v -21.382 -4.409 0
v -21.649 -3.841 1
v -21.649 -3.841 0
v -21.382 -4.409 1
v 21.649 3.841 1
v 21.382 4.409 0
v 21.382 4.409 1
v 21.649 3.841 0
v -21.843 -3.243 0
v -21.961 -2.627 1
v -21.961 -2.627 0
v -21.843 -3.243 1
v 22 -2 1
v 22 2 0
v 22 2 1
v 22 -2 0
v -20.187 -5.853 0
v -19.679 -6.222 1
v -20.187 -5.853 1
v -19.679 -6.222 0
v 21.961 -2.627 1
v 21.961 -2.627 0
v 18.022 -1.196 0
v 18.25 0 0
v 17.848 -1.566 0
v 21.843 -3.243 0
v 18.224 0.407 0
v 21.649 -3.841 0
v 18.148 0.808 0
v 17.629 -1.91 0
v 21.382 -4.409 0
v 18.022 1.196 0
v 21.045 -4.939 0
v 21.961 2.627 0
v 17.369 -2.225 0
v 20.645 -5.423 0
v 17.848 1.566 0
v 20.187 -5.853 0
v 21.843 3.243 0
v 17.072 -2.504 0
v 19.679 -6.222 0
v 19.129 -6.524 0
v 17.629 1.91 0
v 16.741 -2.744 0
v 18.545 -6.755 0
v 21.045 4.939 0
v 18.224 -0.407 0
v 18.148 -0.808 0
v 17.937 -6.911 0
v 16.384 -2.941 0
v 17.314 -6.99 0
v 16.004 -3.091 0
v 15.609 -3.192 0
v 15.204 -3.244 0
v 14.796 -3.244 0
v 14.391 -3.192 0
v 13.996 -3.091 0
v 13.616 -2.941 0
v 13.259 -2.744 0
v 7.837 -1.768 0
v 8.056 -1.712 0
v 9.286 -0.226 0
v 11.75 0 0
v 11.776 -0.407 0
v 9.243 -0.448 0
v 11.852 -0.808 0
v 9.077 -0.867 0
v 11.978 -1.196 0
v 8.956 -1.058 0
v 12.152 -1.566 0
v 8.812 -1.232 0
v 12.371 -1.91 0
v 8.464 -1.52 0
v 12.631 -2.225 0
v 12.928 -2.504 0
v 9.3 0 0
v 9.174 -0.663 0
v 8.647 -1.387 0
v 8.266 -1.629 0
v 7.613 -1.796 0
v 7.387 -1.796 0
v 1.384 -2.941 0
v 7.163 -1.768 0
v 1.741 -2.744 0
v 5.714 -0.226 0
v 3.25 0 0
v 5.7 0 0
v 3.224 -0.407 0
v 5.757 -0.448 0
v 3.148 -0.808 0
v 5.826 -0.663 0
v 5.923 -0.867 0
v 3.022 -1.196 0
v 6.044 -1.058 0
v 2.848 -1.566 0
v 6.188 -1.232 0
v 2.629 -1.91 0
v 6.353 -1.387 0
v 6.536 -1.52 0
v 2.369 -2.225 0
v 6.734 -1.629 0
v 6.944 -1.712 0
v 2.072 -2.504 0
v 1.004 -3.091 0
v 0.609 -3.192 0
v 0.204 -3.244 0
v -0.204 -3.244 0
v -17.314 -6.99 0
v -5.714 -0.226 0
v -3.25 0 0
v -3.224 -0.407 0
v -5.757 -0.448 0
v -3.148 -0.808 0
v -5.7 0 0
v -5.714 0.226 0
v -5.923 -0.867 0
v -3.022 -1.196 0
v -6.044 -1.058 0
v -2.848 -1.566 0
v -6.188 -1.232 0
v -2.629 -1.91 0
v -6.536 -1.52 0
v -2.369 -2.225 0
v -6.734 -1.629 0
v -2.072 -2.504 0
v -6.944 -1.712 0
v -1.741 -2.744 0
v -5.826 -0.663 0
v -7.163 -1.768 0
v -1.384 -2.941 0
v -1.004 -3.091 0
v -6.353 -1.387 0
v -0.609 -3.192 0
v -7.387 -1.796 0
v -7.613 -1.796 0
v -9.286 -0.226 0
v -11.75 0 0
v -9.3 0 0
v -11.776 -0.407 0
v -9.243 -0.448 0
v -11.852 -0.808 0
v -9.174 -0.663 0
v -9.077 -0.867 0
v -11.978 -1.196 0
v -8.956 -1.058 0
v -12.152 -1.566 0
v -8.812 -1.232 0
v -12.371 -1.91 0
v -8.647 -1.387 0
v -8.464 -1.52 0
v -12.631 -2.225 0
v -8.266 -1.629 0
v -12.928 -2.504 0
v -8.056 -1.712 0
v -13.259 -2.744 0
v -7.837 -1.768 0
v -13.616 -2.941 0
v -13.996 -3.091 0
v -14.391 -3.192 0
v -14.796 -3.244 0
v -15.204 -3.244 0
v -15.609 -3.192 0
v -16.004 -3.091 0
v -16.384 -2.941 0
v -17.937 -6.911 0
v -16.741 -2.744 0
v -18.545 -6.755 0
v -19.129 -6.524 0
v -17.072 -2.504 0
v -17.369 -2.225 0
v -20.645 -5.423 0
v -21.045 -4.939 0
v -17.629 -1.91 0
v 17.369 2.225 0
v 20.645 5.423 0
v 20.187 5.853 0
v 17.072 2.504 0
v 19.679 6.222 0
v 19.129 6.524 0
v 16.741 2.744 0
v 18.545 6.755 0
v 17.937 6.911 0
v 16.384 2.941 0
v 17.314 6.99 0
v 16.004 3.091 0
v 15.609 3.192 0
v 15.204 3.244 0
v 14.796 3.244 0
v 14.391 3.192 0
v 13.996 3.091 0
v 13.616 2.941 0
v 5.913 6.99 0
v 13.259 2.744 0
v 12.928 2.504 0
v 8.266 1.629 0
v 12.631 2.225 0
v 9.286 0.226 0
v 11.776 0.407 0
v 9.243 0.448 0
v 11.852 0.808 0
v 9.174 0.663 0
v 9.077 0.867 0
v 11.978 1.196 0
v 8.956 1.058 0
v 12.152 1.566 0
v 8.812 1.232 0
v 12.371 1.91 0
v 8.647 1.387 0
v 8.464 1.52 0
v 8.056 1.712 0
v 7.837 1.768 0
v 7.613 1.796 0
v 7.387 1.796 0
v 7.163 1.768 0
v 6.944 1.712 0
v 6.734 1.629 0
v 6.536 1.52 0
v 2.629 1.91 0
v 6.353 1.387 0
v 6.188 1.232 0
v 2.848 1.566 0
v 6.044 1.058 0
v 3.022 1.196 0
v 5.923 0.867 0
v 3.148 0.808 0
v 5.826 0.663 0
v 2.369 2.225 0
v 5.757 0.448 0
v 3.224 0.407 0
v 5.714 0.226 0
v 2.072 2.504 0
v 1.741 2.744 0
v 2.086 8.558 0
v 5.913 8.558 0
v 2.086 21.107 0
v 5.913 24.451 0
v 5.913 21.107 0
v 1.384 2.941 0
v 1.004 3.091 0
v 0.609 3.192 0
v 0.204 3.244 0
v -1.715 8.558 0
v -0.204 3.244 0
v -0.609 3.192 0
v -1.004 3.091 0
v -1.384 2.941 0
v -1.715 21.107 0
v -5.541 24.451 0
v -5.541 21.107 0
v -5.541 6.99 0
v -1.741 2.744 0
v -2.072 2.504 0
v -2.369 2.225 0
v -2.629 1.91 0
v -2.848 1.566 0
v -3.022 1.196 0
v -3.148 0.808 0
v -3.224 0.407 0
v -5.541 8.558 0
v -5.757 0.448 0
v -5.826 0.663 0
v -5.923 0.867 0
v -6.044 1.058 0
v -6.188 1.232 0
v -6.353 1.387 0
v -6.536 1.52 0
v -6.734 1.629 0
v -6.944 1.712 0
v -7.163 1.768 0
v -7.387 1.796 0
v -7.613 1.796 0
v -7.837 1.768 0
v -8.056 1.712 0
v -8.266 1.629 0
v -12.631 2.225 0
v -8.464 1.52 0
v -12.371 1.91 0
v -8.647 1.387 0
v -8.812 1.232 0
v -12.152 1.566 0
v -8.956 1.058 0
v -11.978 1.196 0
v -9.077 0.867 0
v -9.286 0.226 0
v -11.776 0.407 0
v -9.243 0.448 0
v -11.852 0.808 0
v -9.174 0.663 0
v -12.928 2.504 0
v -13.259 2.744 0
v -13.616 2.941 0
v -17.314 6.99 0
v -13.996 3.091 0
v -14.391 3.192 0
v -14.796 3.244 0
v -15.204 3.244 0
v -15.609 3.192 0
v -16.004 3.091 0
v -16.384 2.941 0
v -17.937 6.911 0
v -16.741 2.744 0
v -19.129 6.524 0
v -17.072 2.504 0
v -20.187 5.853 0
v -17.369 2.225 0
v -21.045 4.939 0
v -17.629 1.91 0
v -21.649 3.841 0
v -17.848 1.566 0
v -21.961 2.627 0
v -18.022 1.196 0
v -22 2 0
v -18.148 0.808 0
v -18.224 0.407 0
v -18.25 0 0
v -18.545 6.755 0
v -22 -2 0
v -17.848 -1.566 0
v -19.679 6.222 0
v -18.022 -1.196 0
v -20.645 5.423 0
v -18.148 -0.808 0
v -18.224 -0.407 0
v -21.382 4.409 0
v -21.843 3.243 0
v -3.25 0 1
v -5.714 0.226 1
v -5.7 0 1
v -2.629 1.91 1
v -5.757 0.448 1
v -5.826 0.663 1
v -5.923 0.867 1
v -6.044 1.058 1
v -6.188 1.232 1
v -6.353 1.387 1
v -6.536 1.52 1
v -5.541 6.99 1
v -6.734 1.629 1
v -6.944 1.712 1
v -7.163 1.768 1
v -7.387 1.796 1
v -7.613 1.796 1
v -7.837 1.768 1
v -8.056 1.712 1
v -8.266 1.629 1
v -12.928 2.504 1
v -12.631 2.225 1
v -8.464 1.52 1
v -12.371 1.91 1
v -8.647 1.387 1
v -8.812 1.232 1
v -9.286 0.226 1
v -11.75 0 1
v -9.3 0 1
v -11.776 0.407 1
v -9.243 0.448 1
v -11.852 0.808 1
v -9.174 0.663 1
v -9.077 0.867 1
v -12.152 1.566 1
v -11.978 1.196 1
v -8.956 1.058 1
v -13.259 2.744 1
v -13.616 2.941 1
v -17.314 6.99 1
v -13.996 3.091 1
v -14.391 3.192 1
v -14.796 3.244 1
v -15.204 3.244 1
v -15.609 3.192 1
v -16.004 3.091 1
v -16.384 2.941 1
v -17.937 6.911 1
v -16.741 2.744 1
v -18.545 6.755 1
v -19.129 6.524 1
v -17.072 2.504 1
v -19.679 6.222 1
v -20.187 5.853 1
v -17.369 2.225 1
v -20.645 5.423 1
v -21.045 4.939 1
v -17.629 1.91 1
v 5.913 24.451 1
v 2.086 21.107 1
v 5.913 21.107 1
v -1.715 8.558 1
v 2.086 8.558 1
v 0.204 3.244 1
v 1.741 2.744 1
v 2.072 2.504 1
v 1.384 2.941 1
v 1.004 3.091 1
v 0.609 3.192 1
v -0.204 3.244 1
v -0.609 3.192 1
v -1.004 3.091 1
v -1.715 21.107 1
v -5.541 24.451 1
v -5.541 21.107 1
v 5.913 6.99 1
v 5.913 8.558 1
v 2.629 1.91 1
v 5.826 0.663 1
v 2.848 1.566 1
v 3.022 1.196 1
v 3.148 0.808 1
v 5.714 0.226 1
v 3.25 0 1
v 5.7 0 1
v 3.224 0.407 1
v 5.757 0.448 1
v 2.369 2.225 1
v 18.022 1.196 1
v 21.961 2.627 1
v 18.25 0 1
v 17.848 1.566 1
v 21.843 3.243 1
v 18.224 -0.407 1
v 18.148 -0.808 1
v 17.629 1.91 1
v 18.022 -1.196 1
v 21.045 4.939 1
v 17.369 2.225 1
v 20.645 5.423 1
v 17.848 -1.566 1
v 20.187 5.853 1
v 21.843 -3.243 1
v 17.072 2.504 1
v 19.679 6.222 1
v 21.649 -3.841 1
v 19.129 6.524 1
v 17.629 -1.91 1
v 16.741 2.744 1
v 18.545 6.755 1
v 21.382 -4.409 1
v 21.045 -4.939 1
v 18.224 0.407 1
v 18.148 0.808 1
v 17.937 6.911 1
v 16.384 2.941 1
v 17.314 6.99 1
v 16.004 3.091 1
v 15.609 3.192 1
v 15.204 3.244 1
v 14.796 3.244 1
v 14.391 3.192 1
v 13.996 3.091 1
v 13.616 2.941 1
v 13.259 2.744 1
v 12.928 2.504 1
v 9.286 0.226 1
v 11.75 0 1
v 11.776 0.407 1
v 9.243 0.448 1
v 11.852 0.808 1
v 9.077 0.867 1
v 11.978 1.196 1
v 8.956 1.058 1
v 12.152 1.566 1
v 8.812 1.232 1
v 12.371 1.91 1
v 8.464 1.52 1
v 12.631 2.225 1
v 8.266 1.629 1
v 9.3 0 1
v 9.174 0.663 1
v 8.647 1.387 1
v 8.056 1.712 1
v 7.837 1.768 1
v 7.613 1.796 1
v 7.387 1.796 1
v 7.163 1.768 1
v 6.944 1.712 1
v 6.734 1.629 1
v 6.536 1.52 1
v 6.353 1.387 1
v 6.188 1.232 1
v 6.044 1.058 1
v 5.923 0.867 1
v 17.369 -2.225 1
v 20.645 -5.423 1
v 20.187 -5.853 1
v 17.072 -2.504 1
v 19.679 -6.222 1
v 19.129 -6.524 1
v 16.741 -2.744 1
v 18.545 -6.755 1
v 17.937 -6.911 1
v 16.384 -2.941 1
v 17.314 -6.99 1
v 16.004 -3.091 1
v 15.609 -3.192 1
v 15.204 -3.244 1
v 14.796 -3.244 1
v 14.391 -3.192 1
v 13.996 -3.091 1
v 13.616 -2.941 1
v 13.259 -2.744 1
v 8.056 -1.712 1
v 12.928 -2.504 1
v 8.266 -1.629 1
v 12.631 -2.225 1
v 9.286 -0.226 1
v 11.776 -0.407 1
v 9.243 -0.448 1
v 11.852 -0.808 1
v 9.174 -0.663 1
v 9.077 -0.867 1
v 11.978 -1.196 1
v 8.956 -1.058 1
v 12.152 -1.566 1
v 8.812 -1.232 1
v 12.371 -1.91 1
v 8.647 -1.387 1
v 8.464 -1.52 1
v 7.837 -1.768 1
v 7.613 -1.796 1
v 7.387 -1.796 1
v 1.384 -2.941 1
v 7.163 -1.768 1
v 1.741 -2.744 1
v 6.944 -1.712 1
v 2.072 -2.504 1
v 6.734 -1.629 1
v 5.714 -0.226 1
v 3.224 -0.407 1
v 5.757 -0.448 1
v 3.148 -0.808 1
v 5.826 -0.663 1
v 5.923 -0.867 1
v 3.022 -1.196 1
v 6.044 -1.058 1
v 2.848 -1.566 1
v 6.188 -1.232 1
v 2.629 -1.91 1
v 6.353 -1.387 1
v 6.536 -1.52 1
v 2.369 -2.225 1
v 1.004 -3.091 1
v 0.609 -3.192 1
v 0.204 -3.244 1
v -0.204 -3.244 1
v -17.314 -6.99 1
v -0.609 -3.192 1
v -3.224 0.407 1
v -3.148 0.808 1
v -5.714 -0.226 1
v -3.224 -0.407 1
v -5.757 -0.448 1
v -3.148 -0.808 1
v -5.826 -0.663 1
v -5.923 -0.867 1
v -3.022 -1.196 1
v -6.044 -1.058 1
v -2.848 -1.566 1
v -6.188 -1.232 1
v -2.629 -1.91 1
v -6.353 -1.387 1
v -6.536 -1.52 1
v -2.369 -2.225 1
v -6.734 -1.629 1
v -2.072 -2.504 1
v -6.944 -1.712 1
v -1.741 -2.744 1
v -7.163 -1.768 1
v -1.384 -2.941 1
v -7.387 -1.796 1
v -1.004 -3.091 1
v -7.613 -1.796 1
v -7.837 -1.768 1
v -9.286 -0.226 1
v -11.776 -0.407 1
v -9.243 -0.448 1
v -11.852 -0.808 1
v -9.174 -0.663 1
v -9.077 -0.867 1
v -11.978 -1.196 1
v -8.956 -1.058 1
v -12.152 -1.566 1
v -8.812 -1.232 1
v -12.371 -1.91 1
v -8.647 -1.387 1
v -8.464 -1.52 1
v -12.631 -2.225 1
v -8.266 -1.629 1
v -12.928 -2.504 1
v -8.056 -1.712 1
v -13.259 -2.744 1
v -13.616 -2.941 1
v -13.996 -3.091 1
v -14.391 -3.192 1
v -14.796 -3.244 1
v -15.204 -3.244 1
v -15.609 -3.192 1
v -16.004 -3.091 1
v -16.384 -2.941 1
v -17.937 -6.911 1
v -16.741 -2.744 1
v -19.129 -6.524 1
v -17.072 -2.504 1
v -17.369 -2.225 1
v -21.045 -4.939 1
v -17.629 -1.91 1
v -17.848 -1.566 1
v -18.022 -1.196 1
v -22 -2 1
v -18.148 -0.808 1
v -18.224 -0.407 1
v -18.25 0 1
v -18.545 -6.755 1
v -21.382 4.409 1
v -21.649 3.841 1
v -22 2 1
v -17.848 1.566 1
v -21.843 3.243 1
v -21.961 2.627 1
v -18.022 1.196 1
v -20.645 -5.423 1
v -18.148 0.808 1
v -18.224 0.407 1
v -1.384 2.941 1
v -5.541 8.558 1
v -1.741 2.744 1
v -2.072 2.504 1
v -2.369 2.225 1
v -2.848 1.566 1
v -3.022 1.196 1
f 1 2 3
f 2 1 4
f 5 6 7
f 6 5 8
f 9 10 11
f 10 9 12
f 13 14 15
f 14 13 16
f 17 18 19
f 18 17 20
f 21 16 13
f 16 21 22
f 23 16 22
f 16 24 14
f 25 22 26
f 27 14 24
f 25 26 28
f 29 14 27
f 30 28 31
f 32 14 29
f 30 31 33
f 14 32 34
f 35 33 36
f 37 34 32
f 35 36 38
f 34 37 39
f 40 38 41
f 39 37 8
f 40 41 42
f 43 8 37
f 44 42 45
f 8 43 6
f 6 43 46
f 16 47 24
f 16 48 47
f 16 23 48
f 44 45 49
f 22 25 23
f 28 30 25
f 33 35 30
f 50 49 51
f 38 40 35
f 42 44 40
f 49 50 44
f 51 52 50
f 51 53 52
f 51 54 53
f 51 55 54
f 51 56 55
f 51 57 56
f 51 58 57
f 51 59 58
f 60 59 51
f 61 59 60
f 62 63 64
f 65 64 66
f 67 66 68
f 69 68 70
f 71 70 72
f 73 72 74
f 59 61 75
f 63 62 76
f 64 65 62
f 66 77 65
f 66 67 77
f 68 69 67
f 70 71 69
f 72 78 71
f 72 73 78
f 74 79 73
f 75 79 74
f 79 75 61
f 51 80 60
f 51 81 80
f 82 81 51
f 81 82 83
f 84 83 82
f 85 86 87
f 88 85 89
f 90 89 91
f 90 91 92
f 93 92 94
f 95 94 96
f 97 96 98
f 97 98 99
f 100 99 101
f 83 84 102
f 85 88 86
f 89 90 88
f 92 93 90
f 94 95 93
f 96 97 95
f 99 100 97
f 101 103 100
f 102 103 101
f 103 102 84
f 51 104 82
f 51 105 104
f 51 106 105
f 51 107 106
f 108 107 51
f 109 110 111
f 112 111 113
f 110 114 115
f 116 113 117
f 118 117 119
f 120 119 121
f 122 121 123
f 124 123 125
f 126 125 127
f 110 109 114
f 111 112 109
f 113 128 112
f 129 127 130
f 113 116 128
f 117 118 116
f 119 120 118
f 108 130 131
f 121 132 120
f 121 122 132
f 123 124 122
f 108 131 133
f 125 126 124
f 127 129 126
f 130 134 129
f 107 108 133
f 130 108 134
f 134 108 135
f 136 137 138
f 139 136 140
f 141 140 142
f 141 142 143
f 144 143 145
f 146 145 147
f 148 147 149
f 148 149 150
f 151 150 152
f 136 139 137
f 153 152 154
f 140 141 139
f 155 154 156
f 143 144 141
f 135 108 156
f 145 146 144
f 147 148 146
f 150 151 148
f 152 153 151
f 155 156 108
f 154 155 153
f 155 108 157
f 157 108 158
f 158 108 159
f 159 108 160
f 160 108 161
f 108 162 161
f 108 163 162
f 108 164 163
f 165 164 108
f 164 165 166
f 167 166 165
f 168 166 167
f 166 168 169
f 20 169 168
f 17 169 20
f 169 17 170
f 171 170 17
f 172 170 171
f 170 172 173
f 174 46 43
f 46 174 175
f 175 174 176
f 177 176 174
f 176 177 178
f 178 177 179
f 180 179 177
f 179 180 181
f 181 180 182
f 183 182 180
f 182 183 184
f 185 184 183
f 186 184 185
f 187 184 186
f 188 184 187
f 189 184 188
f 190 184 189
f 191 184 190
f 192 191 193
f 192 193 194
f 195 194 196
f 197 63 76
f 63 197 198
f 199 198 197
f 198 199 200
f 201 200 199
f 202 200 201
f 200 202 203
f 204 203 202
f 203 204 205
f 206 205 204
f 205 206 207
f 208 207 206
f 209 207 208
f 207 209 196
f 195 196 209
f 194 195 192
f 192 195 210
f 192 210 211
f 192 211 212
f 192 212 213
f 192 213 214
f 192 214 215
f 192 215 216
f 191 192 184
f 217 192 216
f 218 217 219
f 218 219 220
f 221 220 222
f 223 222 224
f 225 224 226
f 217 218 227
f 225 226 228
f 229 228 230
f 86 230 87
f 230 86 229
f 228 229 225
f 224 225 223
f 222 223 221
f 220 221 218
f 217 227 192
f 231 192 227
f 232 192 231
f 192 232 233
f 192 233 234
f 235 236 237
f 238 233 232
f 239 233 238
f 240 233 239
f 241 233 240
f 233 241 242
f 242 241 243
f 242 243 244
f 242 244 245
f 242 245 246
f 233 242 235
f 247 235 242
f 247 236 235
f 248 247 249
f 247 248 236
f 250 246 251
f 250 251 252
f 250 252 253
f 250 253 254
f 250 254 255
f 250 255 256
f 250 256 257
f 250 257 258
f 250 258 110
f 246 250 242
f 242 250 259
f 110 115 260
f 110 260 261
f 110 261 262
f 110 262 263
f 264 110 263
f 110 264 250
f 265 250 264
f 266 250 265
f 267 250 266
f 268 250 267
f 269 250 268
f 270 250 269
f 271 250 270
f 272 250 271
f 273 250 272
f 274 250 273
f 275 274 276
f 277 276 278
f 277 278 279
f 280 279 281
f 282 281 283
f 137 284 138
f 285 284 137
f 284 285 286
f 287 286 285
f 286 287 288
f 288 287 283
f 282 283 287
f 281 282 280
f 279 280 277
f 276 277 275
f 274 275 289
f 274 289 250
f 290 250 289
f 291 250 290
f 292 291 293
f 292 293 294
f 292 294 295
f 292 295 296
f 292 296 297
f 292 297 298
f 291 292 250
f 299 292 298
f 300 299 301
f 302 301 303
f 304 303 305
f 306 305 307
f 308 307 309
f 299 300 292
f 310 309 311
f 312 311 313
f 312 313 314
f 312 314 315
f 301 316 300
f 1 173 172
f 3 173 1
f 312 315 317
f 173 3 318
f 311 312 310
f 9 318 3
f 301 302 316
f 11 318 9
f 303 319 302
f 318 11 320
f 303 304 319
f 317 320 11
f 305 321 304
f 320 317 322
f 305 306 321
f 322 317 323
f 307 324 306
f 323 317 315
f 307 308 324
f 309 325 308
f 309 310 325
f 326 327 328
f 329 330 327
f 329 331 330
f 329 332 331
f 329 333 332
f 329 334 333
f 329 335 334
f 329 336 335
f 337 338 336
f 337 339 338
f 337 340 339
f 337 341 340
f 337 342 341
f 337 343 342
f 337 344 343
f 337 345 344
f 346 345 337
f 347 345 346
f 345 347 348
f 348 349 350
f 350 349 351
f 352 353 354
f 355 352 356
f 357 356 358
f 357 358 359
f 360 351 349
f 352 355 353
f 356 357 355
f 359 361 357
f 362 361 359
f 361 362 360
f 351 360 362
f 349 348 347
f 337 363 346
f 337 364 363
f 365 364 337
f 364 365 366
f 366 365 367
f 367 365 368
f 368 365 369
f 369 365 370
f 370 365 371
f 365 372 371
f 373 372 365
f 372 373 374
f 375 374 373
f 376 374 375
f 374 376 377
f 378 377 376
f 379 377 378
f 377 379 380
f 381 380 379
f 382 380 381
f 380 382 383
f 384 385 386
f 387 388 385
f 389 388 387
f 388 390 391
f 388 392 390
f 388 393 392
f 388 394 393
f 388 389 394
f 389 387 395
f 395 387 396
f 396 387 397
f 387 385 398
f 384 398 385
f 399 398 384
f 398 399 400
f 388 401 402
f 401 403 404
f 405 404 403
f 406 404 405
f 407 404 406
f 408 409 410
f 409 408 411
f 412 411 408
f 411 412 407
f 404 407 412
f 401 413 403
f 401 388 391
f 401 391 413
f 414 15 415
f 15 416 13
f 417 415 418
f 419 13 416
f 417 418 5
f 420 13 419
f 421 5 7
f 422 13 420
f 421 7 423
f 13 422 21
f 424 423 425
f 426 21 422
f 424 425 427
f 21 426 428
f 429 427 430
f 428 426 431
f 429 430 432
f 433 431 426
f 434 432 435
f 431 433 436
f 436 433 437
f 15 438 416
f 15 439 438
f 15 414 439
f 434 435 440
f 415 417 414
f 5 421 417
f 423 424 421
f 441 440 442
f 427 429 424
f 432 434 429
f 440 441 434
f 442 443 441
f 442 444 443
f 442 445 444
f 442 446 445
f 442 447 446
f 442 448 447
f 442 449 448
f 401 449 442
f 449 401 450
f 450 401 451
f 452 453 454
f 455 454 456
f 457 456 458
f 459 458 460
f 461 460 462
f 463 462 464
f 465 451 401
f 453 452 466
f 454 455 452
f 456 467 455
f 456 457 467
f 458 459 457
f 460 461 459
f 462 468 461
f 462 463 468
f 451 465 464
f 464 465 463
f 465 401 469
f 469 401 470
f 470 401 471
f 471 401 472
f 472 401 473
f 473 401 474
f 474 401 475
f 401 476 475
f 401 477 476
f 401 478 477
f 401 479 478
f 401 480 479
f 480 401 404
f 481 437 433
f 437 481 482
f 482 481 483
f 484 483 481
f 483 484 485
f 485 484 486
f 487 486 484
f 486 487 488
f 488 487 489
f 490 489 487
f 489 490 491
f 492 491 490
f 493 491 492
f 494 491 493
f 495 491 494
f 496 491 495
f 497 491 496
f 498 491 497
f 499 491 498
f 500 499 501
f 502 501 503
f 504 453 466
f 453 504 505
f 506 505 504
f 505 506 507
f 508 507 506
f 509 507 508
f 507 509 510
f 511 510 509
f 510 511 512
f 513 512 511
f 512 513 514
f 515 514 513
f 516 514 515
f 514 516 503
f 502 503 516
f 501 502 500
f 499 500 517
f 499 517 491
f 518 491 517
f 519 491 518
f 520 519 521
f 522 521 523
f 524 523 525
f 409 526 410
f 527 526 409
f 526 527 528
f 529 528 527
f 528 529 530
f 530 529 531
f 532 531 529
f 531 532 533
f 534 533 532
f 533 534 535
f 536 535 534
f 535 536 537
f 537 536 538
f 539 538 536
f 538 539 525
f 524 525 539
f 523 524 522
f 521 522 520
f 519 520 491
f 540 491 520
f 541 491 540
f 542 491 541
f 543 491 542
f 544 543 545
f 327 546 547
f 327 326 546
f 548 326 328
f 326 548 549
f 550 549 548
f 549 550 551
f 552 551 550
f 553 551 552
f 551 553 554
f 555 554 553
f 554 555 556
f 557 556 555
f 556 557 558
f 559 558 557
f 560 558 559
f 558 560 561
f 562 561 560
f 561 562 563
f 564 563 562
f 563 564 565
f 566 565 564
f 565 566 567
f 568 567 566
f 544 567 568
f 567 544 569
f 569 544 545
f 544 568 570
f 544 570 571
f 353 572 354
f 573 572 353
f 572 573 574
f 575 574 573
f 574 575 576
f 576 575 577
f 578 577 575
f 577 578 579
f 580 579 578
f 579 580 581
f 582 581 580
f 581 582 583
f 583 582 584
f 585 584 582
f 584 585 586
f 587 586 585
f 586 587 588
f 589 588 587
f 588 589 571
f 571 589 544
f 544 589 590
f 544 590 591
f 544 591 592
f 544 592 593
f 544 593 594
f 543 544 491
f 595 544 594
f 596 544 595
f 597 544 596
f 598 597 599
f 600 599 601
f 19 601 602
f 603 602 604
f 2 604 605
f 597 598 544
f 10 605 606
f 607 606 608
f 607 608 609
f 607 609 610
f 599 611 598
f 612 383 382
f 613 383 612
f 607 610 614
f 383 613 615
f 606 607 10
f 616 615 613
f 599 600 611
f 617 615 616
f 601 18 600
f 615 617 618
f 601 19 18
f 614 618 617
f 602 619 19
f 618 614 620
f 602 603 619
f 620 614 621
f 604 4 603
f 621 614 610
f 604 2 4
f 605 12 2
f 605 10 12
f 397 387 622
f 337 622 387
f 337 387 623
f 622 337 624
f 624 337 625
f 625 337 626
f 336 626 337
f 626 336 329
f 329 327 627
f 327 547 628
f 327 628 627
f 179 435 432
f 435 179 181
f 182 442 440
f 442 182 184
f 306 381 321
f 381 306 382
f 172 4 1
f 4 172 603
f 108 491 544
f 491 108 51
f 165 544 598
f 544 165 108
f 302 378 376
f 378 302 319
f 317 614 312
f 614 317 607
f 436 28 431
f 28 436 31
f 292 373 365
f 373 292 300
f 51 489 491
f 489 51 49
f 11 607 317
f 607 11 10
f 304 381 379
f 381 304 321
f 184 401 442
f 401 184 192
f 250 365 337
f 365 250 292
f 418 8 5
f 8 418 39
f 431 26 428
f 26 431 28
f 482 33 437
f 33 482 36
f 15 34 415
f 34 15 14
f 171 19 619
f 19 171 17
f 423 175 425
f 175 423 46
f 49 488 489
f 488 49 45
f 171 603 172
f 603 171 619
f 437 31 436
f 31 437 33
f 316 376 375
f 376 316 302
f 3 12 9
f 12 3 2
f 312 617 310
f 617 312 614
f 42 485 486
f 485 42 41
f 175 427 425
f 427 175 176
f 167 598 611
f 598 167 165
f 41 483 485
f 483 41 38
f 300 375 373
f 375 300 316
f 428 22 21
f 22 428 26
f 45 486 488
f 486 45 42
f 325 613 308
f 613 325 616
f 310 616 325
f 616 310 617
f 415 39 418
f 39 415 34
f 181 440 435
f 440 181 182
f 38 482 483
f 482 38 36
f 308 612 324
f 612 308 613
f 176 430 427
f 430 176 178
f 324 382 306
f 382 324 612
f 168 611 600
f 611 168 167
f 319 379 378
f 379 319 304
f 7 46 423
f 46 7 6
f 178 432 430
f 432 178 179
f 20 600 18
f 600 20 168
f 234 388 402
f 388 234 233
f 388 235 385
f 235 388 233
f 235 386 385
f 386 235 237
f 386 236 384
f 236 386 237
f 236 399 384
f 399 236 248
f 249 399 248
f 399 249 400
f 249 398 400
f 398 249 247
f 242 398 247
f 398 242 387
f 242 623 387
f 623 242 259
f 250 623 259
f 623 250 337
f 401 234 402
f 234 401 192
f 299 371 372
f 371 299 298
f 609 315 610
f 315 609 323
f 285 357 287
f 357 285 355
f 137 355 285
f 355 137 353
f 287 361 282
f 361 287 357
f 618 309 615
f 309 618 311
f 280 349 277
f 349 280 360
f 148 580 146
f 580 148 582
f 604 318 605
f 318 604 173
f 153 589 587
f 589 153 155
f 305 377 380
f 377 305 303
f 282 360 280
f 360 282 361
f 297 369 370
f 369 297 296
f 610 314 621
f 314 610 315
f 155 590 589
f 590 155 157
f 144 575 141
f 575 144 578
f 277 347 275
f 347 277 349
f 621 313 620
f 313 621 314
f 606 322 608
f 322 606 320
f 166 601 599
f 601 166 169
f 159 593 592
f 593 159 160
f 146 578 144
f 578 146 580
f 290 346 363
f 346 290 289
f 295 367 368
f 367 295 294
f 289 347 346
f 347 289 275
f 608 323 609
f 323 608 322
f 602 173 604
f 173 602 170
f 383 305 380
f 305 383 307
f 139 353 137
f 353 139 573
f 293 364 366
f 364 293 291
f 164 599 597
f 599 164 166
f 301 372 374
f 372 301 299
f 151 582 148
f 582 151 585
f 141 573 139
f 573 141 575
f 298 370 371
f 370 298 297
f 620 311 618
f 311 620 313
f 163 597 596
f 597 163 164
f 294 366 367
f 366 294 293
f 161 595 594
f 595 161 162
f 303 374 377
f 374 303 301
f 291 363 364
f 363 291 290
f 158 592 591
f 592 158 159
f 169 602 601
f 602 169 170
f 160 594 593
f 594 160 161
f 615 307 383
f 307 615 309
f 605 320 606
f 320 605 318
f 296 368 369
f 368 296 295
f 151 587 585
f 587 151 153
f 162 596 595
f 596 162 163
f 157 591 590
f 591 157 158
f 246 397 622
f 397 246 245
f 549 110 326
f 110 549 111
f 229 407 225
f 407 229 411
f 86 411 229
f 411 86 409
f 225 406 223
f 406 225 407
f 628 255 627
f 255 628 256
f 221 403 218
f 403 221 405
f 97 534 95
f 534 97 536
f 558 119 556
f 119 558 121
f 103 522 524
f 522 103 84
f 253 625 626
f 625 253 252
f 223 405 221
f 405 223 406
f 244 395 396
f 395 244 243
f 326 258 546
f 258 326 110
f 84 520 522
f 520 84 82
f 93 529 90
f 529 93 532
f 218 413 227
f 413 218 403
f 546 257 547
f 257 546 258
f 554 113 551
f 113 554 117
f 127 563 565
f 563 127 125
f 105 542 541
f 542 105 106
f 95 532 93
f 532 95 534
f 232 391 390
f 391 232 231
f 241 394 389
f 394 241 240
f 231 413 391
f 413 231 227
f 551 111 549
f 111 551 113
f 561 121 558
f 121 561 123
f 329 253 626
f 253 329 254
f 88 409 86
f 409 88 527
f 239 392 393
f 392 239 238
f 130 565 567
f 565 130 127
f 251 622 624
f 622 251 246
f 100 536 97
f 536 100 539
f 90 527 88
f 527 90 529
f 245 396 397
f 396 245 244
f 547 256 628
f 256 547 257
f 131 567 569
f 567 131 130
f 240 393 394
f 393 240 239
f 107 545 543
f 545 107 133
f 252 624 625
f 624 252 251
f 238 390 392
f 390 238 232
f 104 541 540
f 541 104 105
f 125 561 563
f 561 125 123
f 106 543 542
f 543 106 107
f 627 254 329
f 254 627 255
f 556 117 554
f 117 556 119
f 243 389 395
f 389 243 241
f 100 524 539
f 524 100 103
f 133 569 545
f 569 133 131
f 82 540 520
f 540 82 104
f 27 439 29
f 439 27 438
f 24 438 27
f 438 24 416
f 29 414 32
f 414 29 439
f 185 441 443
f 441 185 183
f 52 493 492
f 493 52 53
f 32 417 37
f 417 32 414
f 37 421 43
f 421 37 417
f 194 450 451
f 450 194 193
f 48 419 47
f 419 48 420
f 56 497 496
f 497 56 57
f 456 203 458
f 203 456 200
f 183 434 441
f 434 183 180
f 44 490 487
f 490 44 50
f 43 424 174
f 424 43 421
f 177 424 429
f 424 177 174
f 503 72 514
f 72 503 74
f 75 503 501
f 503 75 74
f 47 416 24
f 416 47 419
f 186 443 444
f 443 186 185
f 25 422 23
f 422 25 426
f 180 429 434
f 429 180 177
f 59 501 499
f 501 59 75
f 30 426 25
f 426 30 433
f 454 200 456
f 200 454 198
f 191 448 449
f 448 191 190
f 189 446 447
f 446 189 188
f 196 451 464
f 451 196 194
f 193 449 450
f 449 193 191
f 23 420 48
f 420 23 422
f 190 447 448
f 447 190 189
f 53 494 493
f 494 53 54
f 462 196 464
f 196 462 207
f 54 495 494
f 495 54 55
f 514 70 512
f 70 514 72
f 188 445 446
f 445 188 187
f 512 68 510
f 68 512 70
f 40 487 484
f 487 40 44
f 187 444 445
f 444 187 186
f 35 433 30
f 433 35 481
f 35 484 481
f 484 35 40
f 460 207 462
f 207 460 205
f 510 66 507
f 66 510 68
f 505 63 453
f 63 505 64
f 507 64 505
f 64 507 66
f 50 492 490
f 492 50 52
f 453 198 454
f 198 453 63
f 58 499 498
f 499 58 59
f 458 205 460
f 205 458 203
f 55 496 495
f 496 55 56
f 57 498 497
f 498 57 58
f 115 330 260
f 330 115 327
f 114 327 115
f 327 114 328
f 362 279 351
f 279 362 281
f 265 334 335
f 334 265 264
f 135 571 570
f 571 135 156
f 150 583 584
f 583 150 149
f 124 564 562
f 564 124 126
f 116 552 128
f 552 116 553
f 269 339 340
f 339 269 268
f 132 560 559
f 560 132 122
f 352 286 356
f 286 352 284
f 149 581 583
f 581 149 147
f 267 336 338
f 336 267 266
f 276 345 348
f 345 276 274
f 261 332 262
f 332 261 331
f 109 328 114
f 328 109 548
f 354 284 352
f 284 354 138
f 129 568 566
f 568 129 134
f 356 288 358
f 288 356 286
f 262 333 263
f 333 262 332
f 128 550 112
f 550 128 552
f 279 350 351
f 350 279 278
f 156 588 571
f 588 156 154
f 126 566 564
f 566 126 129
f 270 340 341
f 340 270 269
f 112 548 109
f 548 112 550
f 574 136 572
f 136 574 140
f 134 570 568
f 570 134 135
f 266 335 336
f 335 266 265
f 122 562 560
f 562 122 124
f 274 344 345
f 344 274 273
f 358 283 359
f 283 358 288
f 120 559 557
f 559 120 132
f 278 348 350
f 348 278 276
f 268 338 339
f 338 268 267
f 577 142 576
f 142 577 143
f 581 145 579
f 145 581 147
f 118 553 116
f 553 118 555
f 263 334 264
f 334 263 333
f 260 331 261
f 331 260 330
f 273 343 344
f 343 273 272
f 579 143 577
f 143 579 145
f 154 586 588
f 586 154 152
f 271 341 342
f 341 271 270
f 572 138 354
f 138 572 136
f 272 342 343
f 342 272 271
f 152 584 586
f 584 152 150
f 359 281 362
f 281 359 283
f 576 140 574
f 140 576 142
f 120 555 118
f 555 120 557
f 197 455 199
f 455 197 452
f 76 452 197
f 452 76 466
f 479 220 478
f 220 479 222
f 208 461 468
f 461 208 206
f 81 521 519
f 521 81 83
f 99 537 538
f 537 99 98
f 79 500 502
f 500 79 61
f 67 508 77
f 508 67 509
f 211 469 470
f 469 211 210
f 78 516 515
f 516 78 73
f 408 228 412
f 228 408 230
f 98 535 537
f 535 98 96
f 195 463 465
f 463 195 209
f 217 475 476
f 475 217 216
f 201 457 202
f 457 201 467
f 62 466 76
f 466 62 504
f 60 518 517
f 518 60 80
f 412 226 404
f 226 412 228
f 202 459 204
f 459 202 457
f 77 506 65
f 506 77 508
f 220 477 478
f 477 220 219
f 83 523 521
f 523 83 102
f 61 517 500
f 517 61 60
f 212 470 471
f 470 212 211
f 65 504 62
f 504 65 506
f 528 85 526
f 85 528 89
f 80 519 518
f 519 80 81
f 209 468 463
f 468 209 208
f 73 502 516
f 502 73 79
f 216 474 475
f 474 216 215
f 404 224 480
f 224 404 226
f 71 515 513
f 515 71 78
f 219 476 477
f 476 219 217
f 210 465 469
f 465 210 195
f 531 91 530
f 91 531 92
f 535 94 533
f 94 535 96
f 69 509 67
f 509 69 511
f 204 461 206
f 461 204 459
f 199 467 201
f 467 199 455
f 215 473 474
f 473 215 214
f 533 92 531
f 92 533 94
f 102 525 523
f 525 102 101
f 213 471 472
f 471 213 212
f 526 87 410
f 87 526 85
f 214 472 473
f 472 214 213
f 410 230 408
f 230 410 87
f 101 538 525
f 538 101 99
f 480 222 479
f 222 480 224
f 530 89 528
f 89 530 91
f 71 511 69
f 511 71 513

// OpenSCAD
$fn = 50;


difference() {
	union() {
		hull() {
			translate(v = [-17.0000000000, 2.0000000000, 0]) {
				cylinder(h = 1, r = 5);
			}
			translate(v = [17.0000000000, 2.0000000000, 0]) {
				cylinder(h = 1, r = 5);
			}
			translate(v = [-17.0000000000, -2.0000000000, 0]) {
				cylinder(h = 1, r = 5);
			}
			translate(v = [17.0000000000, -2.0000000000, 0]) {
				cylinder(h = 1, r = 5);
			}
		}
		translate(v = [0, 24, 0]) {
			linear_extrude(height = 1) {
				text(font = "DejaVu Sans Mono:style=Bold", halign = "center", size = 19.0000000000, text = "I", valign = "top");
			}
		}
	}
	union() {
		translate(v = [-15.0000000000, 0.0000000000, 0]) {
			translate(v = [0, 0, -100]) {
				cylinder(h = 200, r = 3.2500000000);
			}
		}
		translate(v = [0, 0, -100]) {
			cylinder(h = 200, r = 3.2500000000);
		}
		translate(v = [15.0000000000, 0.0000000000, 0]) {
			translate(v = [0, 0, -100]) {
				cylinder(h = 200, r = 3.2500000000);
			}
		}
		translate(v = [-15.0000000000, 0.0000000000, 0]) {
			translate(v = [0, 0, -100]) {
				cylinder(h = 200, r = 1.8000000000);
			}
		}
		translate(v = [-7.5000000000, 0.0000000000, 0]) {
			translate(v = [0, 0, -100]) {
				cylinder(h = 200, r = 1.8000000000);
			}
		}
		translate(v = [0, 0, -100]) {
			cylinder(h = 200, r = 1.8000000000);
		}
		translate(v = [7.5000000000, 0.0000000000, 0]) {
			translate(v = [0, 0, -100]) {
				cylinder(h = 200, r = 1.8000000000);
			}
		}
		translate(v = [15.0000000000, 0.0000000000, 0]) {
			translate(v = [0, 0, -100]) {
				cylinder(h = 200, r = 1.8000000000);
			}
		}
	}
}
